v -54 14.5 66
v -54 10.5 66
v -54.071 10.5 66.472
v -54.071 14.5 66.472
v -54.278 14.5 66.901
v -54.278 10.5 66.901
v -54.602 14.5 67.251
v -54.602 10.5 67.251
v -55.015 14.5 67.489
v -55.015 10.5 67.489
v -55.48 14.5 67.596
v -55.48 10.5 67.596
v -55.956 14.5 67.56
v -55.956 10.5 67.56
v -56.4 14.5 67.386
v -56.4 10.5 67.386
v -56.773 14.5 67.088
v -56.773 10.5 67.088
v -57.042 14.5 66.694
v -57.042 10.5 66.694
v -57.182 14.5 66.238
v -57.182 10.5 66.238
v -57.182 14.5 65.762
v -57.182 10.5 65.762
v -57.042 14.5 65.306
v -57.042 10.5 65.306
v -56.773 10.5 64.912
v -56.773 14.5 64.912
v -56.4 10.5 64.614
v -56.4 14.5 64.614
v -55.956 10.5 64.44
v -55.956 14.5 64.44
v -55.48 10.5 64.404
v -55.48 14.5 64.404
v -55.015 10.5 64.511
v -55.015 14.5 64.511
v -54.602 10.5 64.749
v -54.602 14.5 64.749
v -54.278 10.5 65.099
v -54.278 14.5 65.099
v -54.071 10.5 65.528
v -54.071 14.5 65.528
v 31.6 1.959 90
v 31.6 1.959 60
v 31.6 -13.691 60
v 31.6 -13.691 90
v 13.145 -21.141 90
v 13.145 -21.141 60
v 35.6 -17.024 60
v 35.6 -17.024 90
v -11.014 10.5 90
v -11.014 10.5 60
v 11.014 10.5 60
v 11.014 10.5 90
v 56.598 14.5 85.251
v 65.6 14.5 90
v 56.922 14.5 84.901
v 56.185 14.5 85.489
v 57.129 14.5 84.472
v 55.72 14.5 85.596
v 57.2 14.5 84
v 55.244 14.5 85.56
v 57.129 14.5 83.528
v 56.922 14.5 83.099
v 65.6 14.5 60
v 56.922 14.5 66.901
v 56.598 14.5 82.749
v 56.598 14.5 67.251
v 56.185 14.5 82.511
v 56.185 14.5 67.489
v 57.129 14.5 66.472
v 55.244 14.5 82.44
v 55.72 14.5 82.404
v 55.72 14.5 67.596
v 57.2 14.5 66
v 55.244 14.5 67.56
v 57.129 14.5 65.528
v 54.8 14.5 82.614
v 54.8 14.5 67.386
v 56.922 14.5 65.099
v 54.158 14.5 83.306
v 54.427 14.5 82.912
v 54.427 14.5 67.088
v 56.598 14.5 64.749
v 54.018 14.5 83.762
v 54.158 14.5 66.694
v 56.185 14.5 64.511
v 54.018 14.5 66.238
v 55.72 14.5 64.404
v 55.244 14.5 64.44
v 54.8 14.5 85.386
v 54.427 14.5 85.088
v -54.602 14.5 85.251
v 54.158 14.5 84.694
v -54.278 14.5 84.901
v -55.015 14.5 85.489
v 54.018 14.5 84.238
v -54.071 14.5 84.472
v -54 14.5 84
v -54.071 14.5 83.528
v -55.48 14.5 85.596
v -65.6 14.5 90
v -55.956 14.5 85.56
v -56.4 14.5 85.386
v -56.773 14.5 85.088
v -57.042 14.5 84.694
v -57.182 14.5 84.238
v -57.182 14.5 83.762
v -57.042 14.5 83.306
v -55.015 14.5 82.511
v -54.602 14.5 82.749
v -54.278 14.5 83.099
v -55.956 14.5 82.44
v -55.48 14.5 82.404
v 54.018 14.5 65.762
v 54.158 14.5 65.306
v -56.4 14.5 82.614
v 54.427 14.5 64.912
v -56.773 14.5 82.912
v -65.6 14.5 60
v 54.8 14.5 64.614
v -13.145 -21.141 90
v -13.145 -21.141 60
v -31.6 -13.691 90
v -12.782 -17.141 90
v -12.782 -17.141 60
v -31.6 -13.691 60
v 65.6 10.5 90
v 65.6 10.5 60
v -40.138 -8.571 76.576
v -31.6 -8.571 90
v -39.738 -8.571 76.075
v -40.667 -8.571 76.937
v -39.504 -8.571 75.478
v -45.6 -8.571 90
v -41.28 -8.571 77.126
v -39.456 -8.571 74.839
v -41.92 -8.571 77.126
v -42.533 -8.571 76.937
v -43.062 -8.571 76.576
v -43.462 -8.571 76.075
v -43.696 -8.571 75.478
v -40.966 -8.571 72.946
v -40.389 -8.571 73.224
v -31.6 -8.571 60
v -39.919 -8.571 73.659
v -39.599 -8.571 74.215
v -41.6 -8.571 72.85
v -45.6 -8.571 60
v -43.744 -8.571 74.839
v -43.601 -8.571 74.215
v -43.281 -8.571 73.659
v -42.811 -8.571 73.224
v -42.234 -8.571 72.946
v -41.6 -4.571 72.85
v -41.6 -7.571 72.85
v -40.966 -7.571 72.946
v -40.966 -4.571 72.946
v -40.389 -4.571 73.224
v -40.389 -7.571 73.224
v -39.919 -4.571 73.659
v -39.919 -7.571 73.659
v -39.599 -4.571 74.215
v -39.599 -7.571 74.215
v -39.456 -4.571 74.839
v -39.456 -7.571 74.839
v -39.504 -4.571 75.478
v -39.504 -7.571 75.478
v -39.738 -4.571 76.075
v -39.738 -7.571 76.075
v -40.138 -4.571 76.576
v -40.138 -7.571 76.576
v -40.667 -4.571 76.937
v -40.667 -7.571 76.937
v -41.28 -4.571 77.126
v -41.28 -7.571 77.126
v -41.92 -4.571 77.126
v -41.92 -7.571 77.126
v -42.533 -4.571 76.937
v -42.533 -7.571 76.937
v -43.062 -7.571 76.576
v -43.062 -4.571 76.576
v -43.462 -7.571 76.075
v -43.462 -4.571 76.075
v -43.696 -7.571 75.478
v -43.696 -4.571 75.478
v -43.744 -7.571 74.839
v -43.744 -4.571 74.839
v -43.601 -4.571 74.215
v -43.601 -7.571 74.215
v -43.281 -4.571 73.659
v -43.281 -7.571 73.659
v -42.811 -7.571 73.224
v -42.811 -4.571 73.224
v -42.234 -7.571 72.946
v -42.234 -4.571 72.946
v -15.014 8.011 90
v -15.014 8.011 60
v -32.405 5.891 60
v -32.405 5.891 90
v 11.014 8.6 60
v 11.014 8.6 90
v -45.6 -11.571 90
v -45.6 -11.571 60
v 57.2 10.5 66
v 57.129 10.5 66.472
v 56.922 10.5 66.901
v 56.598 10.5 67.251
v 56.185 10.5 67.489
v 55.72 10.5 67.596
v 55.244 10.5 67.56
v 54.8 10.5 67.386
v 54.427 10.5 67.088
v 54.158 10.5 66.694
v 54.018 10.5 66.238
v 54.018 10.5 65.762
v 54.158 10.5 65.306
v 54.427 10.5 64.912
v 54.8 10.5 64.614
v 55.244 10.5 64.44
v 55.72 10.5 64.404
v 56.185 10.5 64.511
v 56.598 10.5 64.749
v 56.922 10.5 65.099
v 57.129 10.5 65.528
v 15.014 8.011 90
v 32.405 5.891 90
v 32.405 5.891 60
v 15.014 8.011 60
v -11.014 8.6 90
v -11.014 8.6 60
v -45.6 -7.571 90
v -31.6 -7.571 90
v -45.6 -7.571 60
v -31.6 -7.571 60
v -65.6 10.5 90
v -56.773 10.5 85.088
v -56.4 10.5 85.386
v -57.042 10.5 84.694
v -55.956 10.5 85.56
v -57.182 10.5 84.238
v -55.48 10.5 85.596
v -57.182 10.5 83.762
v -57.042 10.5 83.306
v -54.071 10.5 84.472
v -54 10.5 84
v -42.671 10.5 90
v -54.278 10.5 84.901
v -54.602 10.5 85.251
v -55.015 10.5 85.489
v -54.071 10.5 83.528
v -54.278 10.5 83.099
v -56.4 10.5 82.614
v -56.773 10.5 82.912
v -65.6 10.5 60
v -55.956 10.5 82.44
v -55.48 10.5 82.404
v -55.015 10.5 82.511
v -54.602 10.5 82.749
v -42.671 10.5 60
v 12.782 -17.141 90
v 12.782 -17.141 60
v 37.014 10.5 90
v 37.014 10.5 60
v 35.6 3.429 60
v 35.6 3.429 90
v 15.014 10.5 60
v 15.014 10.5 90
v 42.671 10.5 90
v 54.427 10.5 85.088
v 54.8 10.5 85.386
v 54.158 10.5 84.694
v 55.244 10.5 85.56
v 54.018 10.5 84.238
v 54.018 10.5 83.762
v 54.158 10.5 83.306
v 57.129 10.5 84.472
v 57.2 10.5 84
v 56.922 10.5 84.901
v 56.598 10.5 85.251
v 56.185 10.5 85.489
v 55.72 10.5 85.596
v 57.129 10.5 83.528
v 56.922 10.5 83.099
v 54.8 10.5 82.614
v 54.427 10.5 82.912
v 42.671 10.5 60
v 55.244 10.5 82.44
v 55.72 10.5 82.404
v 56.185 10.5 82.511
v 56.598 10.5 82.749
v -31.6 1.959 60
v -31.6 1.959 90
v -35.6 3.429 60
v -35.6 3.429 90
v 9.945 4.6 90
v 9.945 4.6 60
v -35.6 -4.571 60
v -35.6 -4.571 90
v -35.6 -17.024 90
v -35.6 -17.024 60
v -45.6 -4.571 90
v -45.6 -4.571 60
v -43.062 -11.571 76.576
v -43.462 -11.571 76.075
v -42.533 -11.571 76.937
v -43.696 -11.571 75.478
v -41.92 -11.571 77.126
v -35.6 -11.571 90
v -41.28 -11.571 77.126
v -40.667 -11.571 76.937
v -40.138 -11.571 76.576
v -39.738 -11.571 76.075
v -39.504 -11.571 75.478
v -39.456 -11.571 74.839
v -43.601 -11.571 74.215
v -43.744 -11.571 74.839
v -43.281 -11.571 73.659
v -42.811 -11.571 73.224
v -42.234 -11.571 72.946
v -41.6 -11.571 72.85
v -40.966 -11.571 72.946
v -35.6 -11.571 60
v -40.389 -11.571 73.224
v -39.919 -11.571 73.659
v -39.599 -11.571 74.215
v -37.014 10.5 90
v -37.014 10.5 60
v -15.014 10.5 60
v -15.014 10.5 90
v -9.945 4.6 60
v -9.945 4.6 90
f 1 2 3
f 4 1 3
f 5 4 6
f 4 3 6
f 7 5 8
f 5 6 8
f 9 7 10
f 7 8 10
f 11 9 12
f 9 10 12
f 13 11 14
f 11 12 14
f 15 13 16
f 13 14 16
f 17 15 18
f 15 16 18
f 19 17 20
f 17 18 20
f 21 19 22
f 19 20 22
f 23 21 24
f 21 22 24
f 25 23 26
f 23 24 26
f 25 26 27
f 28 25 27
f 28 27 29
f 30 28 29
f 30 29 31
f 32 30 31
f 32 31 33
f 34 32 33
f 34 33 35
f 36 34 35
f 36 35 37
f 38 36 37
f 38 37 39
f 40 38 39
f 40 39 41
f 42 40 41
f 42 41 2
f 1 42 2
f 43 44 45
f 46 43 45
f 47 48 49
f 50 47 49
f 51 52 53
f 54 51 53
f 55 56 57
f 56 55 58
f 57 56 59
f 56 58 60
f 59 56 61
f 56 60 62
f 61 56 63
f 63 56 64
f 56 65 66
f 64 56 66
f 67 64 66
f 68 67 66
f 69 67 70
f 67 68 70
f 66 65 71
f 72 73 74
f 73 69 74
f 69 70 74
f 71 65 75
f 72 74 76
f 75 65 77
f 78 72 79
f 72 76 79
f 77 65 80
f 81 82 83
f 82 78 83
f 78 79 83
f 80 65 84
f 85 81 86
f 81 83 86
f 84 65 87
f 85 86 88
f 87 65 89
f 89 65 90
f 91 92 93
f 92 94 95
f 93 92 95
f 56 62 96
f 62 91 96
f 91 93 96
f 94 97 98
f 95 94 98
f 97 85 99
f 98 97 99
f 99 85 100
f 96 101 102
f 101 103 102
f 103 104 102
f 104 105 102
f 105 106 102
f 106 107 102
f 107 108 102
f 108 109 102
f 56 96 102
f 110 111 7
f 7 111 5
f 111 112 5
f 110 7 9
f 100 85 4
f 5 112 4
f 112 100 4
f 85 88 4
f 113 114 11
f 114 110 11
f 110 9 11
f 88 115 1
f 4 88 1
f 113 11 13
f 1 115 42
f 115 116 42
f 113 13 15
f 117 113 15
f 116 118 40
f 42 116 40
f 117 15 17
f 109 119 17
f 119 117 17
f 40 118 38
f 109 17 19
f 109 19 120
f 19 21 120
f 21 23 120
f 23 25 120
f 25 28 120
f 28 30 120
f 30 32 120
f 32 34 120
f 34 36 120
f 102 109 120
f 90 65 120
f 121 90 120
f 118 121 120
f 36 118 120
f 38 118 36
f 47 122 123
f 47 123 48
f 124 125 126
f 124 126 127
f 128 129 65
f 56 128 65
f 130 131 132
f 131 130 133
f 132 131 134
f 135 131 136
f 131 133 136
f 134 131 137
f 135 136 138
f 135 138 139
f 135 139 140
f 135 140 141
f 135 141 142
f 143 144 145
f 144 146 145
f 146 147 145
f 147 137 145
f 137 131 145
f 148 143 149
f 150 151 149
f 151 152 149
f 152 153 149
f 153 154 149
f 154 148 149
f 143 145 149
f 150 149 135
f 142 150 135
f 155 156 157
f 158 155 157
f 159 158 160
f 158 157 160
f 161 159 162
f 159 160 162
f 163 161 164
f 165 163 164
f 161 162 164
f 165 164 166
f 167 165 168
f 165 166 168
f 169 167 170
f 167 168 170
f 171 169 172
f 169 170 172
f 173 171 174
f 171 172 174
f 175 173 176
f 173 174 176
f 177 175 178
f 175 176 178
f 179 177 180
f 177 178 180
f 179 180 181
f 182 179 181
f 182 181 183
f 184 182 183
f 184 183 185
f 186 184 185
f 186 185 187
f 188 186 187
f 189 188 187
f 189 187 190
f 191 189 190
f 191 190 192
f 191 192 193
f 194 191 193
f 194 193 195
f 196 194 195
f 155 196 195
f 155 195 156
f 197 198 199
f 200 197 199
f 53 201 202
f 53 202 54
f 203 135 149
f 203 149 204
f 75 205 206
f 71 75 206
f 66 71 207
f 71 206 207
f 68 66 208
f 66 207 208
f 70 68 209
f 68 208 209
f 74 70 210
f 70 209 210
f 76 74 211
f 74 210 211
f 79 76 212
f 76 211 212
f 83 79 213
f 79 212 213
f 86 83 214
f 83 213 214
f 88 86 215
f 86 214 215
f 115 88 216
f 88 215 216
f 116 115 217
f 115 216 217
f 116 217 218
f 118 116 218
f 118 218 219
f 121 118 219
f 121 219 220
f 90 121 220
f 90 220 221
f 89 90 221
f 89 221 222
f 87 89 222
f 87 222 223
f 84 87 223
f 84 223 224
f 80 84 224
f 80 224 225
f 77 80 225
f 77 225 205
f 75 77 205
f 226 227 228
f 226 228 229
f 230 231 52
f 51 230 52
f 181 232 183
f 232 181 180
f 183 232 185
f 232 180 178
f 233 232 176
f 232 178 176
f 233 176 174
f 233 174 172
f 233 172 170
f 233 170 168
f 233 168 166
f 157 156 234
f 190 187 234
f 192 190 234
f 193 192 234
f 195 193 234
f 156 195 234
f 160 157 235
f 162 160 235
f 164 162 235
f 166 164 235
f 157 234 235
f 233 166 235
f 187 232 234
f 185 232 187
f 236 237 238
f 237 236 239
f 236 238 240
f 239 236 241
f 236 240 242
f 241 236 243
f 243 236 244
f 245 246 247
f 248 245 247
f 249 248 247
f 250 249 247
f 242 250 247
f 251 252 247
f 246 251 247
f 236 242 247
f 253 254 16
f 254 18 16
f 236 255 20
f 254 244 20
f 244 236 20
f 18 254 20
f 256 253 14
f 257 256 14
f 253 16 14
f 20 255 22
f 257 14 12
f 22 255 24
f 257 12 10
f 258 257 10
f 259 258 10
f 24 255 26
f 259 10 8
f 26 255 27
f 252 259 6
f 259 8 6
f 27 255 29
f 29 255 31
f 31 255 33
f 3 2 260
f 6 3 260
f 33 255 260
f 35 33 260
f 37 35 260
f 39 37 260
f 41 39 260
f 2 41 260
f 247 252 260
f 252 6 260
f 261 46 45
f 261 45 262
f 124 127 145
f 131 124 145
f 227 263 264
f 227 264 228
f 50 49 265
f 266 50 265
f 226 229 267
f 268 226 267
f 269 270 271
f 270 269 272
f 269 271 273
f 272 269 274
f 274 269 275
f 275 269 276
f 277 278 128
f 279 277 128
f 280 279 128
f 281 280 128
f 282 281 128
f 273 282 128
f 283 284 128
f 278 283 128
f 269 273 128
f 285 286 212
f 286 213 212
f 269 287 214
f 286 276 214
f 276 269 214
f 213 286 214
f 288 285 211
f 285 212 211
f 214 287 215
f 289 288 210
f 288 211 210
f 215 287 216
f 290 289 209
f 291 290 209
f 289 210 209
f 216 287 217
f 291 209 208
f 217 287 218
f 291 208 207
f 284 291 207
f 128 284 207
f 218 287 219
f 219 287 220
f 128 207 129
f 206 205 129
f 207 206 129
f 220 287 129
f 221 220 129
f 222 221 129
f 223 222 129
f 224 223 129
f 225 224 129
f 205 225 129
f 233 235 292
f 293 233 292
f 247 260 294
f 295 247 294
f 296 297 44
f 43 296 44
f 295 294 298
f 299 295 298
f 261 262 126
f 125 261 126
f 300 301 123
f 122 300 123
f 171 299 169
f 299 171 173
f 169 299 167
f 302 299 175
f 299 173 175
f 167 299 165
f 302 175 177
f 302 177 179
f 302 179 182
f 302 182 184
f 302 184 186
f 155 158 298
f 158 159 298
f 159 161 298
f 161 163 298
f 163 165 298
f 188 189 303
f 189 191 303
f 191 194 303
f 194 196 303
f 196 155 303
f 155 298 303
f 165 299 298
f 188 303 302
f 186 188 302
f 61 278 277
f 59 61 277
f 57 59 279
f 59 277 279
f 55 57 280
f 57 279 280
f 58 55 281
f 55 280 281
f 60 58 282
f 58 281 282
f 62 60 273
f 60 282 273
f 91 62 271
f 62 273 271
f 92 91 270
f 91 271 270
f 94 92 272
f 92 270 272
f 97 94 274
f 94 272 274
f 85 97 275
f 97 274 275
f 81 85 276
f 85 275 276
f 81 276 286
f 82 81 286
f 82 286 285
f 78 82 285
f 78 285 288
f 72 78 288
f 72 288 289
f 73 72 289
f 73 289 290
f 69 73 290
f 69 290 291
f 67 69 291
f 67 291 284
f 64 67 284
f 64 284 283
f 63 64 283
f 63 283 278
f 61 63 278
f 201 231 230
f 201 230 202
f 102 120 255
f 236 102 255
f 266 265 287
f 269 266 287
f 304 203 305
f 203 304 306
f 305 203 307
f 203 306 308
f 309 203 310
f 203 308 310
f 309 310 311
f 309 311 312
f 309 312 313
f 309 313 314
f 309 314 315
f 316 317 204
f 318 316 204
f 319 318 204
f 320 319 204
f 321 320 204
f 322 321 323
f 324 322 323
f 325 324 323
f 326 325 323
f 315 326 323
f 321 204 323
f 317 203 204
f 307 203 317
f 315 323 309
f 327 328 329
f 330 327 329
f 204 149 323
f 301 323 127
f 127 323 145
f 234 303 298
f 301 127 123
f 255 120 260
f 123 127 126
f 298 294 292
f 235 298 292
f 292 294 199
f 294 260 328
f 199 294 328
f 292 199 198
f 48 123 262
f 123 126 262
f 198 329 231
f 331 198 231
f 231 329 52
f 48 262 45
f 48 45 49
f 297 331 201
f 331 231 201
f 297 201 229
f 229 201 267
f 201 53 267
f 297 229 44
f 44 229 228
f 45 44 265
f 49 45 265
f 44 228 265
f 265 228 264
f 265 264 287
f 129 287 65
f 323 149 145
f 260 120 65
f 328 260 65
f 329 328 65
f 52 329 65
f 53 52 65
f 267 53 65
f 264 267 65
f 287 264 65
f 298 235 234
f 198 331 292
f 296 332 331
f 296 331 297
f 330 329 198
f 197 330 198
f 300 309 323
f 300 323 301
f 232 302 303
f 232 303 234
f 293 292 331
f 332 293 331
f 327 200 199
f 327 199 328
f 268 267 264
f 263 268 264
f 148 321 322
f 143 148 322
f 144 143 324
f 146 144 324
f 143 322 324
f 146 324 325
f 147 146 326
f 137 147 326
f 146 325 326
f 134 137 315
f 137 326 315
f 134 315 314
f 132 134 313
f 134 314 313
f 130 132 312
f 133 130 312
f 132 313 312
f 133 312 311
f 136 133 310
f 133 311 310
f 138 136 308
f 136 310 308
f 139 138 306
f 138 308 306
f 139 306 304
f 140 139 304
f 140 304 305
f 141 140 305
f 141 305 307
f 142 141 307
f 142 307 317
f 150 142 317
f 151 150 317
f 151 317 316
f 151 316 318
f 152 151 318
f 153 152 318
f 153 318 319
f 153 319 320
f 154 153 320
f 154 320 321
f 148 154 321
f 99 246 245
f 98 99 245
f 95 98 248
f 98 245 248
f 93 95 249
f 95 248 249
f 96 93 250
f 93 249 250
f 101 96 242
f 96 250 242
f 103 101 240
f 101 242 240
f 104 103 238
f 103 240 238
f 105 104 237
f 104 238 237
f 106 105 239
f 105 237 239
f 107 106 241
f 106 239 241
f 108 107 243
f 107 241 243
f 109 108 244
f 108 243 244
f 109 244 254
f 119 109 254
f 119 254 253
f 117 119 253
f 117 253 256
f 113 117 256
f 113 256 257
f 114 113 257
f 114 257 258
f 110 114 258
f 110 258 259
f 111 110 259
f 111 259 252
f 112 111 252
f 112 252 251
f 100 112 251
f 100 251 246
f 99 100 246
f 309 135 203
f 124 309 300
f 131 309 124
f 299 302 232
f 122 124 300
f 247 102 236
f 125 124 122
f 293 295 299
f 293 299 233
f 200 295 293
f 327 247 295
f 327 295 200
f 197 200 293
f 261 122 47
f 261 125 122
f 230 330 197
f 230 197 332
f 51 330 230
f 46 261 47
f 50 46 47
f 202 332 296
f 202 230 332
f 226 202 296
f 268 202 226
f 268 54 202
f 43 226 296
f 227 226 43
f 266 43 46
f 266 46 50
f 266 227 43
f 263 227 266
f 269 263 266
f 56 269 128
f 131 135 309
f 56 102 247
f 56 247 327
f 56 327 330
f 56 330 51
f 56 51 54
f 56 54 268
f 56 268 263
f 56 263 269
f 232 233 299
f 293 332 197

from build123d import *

# Parameters (mm, degrees)
EXTRUDE1_DEPTH      = 20
EXTRUDE1_DEPTH_BACK = 10
SKETCH2_W           = 22.028427124
SKETCH2_H           = 1.9
SKETCH3_R           = 1.6
CUT_EXTRUDE1_DEPTH  = 20
SKETCH4_R           = 2.15
CUT_EXTRUDE2_DEPTH  = 15


with BuildPart() as part:
    # Sketch2 → Extrude1 (new, two sides: drawn at the far end of the back side and taken through both)
    with BuildSketch(Plane.XY.offset(70).offset(-EXTRUDE1_DEPTH_BACK)):
        Polygon((31.6, 1.959185913), (31.6, -13.690519995), (12.781818432, -17.14052), (-12.781818445, -17.14052), (-31.6, -13.690519995), (-31.6, -8.571067812), (-45.6, -8.571067812), (-45.6, -11.571067812), (-35.6, -11.571067812), (-35.6, -17.023853319), (-13.145454814, -21.14052), (13.145454801, -21.14052), (35.6, -17.023853319), (35.6, 3.428932188), (42.671067812, 10.5), (65.6, 10.5), (65.6, 14.5), (-65.6, 14.5), (-65.6, 10.5), (-42.671067812, 10.5), (-35.6, 3.428932188), (-35.6, -4.571067812), (-45.6, -4.571067812), (-45.6, -7.571067812), (-31.6, -7.571067812), (-31.6, 1.959185913), (-9.945324486, 4.6), (9.945324486, 4.6), align=None)
        Polygon((37.014213562, 10.5), (32.404878042, 5.890664479), (15.014213562, 8.011477221), (15.014213562, 10.5), align=None, mode=Mode.SUBTRACT)
        with Locations((0, 9.55)):
            Rectangle(SKETCH2_W, SKETCH2_H, mode=Mode.SUBTRACT)
        Polygon((-15.014213562, 10.5), (-15.014213562, 8.011477221), (-32.404878042, 5.890664479), (-37.014213562, 10.5), align=None, mode=Mode.SUBTRACT)
    extrude(amount=EXTRUDE1_DEPTH + EXTRUDE1_DEPTH_BACK)

    # Sketch3 → Cut-Extrude1 (cut)
    with BuildSketch(Plane.XZ.offset(-10.5)):
        with Locations((-55.6, 84)):
            Circle(SKETCH3_R)
        with Locations((-55.6, 66)):
            Circle(SKETCH3_R)
        with Locations((55.6, 84)):
            Circle(SKETCH3_R)
        with Locations((55.6, 66)):
            Circle(SKETCH3_R)
    extrude(amount=-CUT_EXTRUDE1_DEPTH, mode=Mode.SUBTRACT)

    # Sketch4 → Cut-Extrude2 (cut)
    with BuildSketch(Plane.XZ.offset(11.571067812)):
        with Locations(Location((-41.6, 75, 0), (0, 0, 270))):
            Circle(SKETCH4_R)
    extrude(amount=-CUT_EXTRUDE2_DEPTH, mode=Mode.SUBTRACT)


solid = part.part
